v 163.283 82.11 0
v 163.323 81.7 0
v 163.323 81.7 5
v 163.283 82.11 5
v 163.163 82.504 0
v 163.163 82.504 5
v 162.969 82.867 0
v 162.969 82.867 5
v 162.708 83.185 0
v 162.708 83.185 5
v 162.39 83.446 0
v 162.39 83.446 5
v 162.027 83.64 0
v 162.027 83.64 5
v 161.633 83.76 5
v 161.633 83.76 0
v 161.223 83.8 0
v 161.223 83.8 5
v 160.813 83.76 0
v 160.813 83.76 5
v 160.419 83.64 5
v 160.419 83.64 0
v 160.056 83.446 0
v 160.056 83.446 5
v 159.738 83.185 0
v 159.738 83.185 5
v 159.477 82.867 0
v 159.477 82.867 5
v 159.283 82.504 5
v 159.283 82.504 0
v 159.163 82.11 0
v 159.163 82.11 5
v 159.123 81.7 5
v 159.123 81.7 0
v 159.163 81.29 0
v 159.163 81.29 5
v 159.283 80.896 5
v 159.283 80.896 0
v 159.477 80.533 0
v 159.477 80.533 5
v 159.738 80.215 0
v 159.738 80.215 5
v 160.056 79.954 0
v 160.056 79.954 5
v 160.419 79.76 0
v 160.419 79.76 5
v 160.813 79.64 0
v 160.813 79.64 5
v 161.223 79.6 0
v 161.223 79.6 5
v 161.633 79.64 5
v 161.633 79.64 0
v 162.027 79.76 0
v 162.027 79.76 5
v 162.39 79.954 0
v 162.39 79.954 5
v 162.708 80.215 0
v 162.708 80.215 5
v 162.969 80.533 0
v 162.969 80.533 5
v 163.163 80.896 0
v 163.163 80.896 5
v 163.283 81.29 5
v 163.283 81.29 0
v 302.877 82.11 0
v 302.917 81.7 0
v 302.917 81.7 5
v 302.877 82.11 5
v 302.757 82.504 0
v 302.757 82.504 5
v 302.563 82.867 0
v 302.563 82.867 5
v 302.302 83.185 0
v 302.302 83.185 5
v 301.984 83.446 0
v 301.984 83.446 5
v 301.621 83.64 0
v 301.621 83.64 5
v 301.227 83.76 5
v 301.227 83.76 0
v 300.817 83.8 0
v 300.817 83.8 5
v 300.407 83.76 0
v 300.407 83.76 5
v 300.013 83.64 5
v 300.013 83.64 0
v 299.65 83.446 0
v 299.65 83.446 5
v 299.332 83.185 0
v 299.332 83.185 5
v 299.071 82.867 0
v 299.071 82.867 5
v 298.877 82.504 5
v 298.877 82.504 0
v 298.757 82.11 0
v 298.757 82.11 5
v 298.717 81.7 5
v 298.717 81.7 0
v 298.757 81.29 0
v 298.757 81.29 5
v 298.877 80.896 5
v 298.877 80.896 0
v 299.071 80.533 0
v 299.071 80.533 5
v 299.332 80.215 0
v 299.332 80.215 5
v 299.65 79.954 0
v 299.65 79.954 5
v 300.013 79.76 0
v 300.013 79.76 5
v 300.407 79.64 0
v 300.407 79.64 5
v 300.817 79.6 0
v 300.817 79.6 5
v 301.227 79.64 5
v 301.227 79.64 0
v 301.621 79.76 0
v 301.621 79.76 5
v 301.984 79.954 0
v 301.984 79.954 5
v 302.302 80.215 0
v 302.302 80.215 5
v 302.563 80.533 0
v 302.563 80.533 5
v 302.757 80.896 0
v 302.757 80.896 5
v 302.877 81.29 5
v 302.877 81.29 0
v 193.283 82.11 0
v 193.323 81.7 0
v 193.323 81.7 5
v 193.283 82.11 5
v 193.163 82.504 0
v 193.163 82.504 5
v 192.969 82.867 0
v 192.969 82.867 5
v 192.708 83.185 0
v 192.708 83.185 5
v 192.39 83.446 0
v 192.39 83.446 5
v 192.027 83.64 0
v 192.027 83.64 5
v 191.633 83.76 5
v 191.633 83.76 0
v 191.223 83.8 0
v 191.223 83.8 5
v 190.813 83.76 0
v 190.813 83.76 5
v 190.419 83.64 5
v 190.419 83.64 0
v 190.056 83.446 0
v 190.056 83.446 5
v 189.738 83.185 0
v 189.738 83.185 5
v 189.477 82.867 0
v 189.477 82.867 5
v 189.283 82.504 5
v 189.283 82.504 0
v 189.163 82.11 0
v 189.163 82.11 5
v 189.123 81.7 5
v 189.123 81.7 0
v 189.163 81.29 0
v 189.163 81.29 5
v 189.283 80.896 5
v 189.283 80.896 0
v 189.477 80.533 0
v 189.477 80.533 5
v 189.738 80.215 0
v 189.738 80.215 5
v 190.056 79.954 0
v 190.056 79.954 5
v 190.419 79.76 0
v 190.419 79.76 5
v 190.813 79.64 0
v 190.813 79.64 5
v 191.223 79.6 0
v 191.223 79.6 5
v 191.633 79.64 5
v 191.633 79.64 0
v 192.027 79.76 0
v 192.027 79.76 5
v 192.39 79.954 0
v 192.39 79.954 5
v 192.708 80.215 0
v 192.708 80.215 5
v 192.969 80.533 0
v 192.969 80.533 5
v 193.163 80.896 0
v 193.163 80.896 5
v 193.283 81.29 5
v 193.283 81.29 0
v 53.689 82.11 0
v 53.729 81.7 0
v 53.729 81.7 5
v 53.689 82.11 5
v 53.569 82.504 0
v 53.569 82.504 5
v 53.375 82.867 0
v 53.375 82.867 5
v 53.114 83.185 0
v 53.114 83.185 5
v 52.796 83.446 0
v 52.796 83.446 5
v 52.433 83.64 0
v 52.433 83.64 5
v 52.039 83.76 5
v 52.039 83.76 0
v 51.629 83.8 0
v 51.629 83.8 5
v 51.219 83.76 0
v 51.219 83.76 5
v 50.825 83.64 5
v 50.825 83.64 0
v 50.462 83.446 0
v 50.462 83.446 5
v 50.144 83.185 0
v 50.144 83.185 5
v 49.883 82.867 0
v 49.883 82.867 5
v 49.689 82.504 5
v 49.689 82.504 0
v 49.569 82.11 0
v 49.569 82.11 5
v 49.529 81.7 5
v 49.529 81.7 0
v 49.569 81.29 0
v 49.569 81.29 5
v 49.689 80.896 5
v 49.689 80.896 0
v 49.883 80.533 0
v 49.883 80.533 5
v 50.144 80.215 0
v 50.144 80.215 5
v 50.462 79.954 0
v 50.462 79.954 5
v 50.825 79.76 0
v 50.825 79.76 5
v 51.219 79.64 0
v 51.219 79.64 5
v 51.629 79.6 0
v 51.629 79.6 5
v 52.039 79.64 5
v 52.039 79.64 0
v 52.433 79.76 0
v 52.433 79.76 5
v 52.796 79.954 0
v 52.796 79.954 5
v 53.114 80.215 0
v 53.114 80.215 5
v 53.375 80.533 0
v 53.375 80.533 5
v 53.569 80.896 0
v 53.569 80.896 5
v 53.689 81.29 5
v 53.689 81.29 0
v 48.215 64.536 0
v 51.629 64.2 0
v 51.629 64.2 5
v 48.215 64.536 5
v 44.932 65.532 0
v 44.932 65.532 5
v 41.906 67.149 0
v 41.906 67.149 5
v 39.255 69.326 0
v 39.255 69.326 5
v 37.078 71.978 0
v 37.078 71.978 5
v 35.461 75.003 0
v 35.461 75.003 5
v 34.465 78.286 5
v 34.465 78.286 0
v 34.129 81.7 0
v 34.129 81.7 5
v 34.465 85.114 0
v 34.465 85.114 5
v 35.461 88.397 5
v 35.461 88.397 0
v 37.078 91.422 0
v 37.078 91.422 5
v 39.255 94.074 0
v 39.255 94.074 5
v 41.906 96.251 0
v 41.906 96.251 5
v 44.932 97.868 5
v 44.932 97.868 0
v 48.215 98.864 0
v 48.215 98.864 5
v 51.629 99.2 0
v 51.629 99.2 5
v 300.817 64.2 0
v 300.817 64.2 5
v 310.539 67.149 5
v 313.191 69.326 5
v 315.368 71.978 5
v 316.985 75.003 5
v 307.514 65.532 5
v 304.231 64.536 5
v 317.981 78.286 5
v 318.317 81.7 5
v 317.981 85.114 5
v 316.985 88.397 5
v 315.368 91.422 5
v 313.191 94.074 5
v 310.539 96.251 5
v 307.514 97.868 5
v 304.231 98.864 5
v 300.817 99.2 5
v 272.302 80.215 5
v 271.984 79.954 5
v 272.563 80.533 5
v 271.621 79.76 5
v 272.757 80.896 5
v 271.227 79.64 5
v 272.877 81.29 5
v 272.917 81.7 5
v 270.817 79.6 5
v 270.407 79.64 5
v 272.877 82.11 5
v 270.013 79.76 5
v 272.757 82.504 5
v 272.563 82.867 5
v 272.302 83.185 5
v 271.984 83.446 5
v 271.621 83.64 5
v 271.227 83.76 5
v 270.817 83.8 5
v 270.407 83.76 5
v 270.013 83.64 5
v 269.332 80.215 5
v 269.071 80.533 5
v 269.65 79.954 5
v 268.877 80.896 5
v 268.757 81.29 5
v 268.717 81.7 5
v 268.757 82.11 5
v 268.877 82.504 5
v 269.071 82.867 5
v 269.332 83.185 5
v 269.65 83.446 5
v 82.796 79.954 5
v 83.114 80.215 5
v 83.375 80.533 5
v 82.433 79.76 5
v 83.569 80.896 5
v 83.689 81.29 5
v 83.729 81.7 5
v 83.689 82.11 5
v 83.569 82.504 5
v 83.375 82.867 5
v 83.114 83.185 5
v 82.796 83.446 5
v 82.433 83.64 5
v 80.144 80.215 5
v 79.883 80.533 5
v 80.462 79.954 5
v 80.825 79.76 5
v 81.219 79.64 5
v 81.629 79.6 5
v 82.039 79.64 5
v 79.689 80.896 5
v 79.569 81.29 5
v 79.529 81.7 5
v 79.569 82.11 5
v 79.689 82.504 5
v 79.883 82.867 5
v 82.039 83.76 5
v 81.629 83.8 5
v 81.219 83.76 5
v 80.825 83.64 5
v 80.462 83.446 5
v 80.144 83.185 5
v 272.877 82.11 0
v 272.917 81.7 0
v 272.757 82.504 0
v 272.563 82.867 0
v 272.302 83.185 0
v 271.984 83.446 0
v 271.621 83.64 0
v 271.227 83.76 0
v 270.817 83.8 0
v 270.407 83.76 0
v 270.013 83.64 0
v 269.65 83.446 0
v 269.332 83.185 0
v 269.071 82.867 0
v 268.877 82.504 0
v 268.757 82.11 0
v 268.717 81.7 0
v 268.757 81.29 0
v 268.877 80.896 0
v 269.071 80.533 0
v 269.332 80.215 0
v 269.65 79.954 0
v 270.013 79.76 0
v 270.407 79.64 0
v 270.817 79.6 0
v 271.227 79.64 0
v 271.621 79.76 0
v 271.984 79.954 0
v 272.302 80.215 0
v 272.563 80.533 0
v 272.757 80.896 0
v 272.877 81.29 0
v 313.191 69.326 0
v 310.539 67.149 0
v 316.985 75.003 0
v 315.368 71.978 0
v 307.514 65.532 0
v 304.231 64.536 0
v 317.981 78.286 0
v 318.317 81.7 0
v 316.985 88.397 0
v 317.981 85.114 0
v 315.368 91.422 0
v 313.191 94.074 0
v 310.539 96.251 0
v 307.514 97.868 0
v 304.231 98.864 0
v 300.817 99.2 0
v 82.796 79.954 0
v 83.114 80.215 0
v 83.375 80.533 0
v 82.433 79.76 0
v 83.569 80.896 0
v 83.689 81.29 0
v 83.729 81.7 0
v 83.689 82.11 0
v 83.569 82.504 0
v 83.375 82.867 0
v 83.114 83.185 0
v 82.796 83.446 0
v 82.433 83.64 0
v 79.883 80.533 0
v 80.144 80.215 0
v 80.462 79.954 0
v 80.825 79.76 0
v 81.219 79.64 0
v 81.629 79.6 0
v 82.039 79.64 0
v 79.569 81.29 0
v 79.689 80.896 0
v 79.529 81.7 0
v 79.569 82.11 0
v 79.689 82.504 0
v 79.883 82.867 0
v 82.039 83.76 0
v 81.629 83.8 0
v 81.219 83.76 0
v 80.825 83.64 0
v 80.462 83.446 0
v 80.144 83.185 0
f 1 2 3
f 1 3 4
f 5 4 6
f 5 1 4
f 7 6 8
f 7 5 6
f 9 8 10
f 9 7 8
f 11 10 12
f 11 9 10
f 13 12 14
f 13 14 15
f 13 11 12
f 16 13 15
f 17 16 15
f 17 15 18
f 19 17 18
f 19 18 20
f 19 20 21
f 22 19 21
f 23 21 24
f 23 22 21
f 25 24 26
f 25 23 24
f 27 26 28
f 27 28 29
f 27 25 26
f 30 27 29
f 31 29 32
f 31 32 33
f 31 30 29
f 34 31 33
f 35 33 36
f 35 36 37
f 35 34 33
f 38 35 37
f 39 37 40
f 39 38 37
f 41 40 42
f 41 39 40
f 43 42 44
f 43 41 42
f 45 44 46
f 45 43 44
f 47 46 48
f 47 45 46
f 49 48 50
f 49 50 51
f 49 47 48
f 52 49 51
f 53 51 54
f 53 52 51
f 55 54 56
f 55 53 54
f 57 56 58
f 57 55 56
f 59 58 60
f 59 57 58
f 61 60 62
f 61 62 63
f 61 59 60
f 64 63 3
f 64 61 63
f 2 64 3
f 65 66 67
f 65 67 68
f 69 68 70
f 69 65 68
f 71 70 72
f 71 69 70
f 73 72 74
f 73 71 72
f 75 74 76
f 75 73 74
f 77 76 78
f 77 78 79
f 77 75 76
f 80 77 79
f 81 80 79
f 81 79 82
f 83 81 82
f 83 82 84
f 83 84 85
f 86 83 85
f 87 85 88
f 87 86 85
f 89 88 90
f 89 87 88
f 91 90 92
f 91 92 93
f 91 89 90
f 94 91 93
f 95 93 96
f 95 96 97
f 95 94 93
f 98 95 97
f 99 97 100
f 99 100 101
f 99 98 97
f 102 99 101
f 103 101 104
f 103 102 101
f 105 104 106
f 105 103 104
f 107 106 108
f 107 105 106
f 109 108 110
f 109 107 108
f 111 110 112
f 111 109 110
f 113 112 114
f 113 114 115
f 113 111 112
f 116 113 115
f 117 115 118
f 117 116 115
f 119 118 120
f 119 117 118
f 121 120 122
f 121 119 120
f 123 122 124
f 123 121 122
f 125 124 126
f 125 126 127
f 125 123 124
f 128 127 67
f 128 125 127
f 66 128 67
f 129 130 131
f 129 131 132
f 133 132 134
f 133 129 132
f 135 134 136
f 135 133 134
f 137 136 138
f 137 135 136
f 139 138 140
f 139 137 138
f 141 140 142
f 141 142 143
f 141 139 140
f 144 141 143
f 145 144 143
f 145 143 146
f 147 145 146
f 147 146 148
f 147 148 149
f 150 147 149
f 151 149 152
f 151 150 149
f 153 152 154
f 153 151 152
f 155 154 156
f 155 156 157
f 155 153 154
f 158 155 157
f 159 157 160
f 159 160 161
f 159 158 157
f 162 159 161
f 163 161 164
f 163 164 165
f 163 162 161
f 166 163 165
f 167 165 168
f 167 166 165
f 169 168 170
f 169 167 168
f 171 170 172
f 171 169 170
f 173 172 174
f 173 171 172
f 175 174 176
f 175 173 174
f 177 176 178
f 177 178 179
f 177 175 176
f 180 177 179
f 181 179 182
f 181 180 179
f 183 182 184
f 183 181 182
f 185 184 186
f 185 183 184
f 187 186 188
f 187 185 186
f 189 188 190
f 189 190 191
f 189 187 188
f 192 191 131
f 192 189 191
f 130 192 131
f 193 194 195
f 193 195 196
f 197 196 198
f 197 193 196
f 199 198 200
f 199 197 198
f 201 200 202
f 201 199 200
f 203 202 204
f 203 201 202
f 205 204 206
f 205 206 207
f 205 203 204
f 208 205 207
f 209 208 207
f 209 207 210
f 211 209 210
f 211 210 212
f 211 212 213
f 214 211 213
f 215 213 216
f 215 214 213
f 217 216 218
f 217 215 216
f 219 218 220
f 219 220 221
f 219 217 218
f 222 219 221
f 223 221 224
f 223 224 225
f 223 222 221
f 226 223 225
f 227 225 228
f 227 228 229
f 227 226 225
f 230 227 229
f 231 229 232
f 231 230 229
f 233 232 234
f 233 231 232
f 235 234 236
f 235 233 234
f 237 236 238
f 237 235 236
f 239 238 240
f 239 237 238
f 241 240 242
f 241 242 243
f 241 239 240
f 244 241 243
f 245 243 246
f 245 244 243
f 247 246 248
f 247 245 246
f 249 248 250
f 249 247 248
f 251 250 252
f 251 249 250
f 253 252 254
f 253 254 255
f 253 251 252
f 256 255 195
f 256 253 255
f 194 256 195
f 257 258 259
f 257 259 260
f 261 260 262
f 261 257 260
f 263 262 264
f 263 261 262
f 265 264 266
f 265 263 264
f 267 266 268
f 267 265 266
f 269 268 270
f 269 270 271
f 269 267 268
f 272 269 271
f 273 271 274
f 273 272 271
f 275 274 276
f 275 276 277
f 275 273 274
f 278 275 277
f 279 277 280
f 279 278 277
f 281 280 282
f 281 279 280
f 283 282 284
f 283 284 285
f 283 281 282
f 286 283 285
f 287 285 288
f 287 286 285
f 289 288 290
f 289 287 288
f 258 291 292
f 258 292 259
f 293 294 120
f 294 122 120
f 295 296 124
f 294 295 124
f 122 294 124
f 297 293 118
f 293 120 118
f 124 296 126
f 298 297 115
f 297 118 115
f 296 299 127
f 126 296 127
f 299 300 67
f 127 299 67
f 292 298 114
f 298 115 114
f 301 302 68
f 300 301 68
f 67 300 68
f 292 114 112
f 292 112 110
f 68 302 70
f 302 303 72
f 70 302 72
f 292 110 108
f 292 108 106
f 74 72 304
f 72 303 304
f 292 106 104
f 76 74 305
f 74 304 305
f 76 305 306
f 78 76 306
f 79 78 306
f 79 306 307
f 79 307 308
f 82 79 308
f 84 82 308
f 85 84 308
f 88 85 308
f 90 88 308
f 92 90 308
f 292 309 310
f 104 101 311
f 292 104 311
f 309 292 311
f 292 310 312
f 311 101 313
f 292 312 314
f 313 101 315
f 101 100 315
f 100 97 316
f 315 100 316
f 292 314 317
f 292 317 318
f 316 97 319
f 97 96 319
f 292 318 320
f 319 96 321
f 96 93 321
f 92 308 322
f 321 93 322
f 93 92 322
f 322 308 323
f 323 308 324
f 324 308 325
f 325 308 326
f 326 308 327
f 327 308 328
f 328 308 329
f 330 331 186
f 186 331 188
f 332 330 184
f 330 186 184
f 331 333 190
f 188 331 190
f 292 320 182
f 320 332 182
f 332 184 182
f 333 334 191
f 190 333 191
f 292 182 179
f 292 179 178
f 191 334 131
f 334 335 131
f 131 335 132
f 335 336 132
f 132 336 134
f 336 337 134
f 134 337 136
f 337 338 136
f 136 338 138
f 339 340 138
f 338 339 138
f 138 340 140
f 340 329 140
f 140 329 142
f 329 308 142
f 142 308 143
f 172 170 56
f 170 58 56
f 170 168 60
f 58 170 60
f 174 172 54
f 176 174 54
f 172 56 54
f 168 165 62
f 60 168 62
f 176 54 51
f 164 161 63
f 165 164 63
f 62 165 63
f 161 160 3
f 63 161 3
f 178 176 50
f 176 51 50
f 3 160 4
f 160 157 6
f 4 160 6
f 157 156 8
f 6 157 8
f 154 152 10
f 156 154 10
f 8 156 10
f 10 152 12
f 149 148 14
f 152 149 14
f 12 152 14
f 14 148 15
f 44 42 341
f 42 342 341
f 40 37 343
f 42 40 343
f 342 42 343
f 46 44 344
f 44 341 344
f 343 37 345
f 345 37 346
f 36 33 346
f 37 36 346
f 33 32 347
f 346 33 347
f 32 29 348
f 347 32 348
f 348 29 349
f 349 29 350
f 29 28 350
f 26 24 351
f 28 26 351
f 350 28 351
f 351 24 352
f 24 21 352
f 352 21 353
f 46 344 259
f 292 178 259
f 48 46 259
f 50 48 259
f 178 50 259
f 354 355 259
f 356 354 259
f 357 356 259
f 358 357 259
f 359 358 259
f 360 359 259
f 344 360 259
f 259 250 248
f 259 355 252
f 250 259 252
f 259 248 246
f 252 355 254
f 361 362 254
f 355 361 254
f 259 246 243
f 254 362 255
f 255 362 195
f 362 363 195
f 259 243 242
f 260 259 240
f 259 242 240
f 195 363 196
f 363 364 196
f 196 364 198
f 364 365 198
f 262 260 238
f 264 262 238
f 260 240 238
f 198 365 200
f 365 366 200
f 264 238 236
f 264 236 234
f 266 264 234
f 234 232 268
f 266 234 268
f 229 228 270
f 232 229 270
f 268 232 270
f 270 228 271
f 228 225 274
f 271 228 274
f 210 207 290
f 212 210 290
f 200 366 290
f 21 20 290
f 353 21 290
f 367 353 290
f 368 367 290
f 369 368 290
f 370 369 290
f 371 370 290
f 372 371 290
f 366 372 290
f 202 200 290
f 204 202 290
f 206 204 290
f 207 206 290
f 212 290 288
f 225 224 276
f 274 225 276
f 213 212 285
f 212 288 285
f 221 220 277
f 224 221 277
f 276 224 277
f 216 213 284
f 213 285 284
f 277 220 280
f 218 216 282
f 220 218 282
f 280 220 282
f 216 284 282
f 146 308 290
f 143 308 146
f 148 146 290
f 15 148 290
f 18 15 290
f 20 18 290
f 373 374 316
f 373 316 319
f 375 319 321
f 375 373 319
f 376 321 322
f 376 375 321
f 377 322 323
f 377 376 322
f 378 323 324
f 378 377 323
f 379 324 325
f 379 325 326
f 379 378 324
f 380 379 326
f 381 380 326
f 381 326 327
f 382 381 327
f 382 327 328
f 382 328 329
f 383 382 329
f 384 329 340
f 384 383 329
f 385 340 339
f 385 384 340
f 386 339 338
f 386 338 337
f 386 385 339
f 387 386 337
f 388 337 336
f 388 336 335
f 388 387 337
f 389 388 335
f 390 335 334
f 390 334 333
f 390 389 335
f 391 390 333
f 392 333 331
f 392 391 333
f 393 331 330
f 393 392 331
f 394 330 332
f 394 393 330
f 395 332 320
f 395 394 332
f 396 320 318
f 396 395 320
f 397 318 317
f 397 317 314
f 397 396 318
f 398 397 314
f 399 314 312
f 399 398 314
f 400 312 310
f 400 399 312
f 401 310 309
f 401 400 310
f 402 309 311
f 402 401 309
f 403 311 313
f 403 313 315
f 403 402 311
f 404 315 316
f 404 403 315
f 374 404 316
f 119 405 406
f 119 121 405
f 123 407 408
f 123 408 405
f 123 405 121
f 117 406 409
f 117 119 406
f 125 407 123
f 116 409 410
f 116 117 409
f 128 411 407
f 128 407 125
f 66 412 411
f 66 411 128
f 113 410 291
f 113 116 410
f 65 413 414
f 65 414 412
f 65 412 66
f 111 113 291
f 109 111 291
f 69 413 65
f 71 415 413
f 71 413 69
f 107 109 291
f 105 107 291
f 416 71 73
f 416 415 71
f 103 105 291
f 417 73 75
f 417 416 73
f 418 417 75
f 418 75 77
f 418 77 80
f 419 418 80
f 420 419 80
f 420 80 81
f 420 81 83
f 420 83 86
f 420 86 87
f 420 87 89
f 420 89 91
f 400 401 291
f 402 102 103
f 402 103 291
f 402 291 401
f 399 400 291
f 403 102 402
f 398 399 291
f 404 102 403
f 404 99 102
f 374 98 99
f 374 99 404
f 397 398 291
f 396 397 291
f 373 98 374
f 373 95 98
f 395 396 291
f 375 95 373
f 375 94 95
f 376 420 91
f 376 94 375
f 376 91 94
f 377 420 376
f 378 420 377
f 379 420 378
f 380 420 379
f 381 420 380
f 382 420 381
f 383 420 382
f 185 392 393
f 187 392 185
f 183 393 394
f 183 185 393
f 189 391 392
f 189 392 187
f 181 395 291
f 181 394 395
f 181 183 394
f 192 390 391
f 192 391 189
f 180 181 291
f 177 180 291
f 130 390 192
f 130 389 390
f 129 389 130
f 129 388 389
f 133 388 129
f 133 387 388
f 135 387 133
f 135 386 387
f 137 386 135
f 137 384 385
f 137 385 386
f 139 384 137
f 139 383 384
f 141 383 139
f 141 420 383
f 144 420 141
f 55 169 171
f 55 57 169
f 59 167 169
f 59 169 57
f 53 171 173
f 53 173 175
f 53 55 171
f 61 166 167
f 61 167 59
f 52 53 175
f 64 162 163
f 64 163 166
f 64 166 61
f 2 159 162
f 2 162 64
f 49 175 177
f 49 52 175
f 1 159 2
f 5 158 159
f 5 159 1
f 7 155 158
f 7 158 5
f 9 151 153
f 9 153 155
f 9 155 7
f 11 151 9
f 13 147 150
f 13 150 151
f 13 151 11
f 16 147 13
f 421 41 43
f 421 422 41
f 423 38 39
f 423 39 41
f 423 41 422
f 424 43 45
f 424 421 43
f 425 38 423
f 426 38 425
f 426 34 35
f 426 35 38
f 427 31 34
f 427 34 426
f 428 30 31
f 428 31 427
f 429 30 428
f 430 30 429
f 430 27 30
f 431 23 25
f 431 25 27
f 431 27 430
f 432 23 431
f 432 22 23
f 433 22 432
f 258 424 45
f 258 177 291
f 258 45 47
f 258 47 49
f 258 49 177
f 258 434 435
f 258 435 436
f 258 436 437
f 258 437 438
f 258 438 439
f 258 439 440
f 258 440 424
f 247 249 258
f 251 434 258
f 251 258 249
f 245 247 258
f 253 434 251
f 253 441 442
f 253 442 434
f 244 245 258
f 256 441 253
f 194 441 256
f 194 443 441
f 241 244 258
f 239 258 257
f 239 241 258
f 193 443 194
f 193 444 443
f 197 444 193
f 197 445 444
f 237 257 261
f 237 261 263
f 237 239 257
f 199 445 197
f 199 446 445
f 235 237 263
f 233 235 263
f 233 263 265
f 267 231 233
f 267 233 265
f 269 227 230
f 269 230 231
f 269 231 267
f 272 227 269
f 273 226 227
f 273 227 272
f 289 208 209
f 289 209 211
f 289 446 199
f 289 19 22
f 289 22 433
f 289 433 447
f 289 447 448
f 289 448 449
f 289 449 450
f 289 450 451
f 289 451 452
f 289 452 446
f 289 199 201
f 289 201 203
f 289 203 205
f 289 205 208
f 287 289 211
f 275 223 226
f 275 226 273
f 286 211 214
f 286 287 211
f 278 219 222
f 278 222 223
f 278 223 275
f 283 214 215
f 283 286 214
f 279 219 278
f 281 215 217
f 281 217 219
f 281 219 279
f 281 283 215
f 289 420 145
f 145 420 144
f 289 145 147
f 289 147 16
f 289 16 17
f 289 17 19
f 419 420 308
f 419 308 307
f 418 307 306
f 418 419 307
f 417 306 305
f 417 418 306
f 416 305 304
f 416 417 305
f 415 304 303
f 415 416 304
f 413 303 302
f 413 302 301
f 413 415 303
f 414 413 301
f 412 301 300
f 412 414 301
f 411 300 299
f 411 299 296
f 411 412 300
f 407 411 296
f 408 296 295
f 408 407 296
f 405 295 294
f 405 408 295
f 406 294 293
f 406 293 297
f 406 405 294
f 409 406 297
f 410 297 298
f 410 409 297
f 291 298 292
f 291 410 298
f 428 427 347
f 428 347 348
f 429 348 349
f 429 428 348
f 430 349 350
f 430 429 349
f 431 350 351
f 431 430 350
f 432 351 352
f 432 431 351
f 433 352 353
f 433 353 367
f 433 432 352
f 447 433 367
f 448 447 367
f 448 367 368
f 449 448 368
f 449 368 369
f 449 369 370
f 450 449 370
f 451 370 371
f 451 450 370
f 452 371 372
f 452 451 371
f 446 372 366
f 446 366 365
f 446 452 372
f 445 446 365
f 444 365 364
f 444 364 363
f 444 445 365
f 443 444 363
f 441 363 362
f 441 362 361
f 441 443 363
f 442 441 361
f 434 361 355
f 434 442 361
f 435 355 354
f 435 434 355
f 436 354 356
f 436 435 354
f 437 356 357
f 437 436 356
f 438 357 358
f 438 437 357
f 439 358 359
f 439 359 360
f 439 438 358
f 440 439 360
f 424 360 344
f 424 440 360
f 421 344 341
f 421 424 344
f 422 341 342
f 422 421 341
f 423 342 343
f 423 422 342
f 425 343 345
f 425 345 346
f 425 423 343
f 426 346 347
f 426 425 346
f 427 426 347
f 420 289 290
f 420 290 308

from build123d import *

# Parameters (mm, degrees)
SKETCH1_R           = 2.1
BOSS_EXTRUDE1_DEPTH = 5


with BuildPart() as part:
    # Sketch1 → Boss-Extrude1 (new body)
    with BuildSketch(Plane.XY):
        with BuildLine():
            Line((51.628885754, 99.200000001), (300.816905308, 99.200000001))
            ThreePointArc((300.816905308, 99.200000001), (318.316905308, 81.700000001), (300.816905308, 64.200000001))
            Line((300.816905308, 64.200000001), (51.628885754, 64.200000001))
            ThreePointArc((51.628885754, 64.200000001), (34.128885754, 81.700000001), (51.628885754, 99.200000001))
        make_face()
        with Locations((300.816905308, 81.700000001)):
            Circle(SKETCH1_R, mode=Mode.SUBTRACT)
        with Locations((270.816905308, 81.700000001)):
            Circle(SKETCH1_R, mode=Mode.SUBTRACT)
        with Locations((191.222895531, 81.700000001)):
            Circle(SKETCH1_R, mode=Mode.SUBTRACT)
        with Locations((51.628885754, 81.700000001)):
            Circle(SKETCH1_R, mode=Mode.SUBTRACT)
        with Locations((81.628885754, 81.700000001)):
            Circle(SKETCH1_R, mode=Mode.SUBTRACT)
        with Locations((161.222895531, 81.700000001)):
            Circle(SKETCH1_R, mode=Mode.SUBTRACT)
    extrude(amount=BOSS_EXTRUDE1_DEPTH)


solid = part.part
